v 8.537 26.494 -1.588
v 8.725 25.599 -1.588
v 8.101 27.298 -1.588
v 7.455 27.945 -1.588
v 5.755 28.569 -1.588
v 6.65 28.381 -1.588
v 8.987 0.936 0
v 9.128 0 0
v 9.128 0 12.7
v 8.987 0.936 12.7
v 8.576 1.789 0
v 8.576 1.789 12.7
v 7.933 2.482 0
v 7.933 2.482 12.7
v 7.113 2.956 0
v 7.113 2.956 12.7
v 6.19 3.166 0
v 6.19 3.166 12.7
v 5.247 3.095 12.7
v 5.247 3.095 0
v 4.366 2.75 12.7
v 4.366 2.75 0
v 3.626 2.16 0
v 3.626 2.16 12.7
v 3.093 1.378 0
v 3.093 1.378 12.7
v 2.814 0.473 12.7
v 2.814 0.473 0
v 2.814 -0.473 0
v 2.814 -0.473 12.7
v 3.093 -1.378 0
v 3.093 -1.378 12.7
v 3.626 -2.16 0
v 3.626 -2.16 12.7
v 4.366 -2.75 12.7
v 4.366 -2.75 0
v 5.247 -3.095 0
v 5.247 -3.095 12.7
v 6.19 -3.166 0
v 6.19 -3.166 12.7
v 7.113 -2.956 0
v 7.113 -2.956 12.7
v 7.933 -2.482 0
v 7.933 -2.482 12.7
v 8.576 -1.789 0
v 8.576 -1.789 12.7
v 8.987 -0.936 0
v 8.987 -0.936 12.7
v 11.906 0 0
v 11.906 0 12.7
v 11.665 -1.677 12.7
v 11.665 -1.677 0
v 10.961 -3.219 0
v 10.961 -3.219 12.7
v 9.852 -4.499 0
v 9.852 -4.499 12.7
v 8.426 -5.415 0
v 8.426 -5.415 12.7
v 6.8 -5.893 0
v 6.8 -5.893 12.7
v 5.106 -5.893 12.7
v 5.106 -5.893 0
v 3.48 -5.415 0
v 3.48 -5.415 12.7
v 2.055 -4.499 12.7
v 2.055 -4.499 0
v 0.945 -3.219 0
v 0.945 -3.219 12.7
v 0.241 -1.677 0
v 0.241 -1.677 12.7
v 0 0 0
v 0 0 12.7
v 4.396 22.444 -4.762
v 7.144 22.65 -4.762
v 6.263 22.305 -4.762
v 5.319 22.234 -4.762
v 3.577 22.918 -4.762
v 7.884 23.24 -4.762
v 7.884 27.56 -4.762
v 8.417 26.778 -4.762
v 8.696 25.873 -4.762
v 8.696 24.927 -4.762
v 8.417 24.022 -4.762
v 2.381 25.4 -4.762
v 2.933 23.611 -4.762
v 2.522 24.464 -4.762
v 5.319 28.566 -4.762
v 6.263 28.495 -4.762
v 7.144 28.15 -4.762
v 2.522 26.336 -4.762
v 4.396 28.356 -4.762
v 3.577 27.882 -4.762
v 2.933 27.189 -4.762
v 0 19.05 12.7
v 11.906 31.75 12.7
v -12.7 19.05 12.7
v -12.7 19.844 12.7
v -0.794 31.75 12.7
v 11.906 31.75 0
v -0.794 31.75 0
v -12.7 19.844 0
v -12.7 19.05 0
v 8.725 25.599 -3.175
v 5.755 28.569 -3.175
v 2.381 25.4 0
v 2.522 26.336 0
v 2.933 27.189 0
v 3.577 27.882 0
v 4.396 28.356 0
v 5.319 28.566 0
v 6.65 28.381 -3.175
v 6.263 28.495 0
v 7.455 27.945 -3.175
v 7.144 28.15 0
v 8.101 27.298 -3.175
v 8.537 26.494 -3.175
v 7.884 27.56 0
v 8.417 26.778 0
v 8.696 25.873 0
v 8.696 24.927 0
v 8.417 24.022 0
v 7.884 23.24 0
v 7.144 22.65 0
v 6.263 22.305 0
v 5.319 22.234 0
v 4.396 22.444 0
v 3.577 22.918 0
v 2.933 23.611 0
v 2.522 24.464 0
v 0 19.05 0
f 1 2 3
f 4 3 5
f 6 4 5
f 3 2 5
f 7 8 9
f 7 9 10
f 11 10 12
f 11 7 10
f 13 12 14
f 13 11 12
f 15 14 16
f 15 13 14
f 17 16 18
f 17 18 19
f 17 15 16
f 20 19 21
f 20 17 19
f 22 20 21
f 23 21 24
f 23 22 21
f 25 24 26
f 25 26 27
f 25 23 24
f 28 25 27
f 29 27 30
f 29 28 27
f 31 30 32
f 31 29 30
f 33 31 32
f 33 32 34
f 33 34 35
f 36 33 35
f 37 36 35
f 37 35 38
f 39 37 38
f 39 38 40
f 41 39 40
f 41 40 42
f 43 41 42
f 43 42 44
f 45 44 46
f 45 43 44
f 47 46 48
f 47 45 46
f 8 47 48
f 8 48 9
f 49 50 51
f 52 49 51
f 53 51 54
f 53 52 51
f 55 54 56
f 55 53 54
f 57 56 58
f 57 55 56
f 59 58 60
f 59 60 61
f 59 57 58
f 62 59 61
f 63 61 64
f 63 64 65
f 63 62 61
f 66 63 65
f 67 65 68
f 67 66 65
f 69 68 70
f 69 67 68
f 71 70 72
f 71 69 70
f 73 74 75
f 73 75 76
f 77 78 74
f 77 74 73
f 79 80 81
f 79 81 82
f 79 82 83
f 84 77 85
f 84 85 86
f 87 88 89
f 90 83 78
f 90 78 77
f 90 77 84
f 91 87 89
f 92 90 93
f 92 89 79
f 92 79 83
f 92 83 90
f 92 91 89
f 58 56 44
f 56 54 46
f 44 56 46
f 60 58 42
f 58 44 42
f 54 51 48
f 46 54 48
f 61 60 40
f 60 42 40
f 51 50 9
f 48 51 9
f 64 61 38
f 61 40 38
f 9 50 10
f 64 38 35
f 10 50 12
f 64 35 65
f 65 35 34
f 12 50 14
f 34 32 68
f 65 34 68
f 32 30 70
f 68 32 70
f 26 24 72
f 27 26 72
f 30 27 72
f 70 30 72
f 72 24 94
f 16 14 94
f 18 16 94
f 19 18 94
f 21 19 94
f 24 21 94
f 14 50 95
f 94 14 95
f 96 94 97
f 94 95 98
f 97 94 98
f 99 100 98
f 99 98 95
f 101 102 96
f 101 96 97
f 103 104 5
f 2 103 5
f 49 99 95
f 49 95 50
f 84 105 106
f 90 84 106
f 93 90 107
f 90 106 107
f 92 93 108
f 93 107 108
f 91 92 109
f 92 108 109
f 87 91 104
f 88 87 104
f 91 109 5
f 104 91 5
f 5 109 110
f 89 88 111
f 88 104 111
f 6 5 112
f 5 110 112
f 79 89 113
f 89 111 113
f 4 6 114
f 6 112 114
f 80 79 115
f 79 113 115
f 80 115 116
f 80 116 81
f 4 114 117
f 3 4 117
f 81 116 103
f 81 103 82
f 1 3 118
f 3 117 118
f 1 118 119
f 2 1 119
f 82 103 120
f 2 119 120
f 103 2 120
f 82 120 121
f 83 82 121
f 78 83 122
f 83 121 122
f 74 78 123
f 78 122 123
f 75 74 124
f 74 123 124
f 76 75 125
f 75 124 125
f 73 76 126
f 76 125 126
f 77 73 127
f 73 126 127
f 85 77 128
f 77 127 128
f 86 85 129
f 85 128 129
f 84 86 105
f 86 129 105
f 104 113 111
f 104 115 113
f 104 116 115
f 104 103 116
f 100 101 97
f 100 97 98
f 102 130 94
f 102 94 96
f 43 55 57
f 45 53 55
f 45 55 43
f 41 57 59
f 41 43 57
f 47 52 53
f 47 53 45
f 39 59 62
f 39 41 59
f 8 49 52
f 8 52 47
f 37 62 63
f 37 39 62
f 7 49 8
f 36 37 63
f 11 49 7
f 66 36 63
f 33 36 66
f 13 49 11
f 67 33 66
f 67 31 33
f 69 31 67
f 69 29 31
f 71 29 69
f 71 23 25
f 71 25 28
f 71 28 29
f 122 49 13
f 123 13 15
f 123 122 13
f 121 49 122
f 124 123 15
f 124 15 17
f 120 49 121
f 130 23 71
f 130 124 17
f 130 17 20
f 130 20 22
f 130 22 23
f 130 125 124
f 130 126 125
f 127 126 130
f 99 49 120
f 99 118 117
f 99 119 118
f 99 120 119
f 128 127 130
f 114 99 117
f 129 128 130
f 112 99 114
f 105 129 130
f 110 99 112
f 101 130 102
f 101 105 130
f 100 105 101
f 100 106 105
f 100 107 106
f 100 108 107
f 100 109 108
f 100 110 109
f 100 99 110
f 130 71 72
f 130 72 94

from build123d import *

# Parameters (mm, degrees)
SKETCH1_R           = 3.175
BOSS_EXTRUDE1_DEPTH = 12.7
SKETCH2_R           = 3.175
BOSS_EXTRUDE2_DEPTH = 4.7625
SKETCH3_W           = 1.5875
SKETCH3_H           = 0.79375
CUT_EXTRUDE1_DEPTH  = 9.525


with BuildPart() as part:
    # Sketch1 → Boss-Extrude1 (new body)
    with BuildSketch(Plane.XY):
        with BuildLine():
            Line((0, 0), (0, 19.05))
            Line((0, 19.05), (-12.7, 19.05))
            Line((-12.7, 19.05), (-12.7, 19.84375))
            Line((-12.7, 19.84375), (-0.79375, 31.75))
            Line((-0.79375, 31.75), (11.90625, 31.75))
            Line((11.90625, 31.75), (11.90625, 0))
            ThreePointArc((11.90625, 0), (5.953125, -5.953125), (0, 0))
        make_face()
        with Locations((5.953125, 0)):
            Circle(SKETCH1_R, mode=Mode.SUBTRACT)
    extrude(amount=BOSS_EXTRUDE1_DEPTH)

    # Sketch2 → Boss-Extrude2 (add)
    with BuildSketch(Plane(origin=(0, 0, 0), x_dir=(-1, 0, 0), z_dir=(0, 0, -1))):
        with Locations((-5.55625, 25.4)):
            Circle(SKETCH2_R)
    extrude(amount=BOSS_EXTRUDE2_DEPTH)

    # Sketch3 → Cut-Extrude1 (cut)
    with BuildSketch(Plane(origin=(-12.16693903, 12.16693903, 0), x_dir=(0, 0, 1), z_dir=(-0.707106781, 0.707106781, 0))):
        with Locations((-2.38125, 24.667499295)):
            Rectangle(SKETCH3_W, SKETCH3_H)
    extrude(amount=-CUT_EXTRUDE1_DEPTH, mode=Mode.SUBTRACT)


solid = part.part
